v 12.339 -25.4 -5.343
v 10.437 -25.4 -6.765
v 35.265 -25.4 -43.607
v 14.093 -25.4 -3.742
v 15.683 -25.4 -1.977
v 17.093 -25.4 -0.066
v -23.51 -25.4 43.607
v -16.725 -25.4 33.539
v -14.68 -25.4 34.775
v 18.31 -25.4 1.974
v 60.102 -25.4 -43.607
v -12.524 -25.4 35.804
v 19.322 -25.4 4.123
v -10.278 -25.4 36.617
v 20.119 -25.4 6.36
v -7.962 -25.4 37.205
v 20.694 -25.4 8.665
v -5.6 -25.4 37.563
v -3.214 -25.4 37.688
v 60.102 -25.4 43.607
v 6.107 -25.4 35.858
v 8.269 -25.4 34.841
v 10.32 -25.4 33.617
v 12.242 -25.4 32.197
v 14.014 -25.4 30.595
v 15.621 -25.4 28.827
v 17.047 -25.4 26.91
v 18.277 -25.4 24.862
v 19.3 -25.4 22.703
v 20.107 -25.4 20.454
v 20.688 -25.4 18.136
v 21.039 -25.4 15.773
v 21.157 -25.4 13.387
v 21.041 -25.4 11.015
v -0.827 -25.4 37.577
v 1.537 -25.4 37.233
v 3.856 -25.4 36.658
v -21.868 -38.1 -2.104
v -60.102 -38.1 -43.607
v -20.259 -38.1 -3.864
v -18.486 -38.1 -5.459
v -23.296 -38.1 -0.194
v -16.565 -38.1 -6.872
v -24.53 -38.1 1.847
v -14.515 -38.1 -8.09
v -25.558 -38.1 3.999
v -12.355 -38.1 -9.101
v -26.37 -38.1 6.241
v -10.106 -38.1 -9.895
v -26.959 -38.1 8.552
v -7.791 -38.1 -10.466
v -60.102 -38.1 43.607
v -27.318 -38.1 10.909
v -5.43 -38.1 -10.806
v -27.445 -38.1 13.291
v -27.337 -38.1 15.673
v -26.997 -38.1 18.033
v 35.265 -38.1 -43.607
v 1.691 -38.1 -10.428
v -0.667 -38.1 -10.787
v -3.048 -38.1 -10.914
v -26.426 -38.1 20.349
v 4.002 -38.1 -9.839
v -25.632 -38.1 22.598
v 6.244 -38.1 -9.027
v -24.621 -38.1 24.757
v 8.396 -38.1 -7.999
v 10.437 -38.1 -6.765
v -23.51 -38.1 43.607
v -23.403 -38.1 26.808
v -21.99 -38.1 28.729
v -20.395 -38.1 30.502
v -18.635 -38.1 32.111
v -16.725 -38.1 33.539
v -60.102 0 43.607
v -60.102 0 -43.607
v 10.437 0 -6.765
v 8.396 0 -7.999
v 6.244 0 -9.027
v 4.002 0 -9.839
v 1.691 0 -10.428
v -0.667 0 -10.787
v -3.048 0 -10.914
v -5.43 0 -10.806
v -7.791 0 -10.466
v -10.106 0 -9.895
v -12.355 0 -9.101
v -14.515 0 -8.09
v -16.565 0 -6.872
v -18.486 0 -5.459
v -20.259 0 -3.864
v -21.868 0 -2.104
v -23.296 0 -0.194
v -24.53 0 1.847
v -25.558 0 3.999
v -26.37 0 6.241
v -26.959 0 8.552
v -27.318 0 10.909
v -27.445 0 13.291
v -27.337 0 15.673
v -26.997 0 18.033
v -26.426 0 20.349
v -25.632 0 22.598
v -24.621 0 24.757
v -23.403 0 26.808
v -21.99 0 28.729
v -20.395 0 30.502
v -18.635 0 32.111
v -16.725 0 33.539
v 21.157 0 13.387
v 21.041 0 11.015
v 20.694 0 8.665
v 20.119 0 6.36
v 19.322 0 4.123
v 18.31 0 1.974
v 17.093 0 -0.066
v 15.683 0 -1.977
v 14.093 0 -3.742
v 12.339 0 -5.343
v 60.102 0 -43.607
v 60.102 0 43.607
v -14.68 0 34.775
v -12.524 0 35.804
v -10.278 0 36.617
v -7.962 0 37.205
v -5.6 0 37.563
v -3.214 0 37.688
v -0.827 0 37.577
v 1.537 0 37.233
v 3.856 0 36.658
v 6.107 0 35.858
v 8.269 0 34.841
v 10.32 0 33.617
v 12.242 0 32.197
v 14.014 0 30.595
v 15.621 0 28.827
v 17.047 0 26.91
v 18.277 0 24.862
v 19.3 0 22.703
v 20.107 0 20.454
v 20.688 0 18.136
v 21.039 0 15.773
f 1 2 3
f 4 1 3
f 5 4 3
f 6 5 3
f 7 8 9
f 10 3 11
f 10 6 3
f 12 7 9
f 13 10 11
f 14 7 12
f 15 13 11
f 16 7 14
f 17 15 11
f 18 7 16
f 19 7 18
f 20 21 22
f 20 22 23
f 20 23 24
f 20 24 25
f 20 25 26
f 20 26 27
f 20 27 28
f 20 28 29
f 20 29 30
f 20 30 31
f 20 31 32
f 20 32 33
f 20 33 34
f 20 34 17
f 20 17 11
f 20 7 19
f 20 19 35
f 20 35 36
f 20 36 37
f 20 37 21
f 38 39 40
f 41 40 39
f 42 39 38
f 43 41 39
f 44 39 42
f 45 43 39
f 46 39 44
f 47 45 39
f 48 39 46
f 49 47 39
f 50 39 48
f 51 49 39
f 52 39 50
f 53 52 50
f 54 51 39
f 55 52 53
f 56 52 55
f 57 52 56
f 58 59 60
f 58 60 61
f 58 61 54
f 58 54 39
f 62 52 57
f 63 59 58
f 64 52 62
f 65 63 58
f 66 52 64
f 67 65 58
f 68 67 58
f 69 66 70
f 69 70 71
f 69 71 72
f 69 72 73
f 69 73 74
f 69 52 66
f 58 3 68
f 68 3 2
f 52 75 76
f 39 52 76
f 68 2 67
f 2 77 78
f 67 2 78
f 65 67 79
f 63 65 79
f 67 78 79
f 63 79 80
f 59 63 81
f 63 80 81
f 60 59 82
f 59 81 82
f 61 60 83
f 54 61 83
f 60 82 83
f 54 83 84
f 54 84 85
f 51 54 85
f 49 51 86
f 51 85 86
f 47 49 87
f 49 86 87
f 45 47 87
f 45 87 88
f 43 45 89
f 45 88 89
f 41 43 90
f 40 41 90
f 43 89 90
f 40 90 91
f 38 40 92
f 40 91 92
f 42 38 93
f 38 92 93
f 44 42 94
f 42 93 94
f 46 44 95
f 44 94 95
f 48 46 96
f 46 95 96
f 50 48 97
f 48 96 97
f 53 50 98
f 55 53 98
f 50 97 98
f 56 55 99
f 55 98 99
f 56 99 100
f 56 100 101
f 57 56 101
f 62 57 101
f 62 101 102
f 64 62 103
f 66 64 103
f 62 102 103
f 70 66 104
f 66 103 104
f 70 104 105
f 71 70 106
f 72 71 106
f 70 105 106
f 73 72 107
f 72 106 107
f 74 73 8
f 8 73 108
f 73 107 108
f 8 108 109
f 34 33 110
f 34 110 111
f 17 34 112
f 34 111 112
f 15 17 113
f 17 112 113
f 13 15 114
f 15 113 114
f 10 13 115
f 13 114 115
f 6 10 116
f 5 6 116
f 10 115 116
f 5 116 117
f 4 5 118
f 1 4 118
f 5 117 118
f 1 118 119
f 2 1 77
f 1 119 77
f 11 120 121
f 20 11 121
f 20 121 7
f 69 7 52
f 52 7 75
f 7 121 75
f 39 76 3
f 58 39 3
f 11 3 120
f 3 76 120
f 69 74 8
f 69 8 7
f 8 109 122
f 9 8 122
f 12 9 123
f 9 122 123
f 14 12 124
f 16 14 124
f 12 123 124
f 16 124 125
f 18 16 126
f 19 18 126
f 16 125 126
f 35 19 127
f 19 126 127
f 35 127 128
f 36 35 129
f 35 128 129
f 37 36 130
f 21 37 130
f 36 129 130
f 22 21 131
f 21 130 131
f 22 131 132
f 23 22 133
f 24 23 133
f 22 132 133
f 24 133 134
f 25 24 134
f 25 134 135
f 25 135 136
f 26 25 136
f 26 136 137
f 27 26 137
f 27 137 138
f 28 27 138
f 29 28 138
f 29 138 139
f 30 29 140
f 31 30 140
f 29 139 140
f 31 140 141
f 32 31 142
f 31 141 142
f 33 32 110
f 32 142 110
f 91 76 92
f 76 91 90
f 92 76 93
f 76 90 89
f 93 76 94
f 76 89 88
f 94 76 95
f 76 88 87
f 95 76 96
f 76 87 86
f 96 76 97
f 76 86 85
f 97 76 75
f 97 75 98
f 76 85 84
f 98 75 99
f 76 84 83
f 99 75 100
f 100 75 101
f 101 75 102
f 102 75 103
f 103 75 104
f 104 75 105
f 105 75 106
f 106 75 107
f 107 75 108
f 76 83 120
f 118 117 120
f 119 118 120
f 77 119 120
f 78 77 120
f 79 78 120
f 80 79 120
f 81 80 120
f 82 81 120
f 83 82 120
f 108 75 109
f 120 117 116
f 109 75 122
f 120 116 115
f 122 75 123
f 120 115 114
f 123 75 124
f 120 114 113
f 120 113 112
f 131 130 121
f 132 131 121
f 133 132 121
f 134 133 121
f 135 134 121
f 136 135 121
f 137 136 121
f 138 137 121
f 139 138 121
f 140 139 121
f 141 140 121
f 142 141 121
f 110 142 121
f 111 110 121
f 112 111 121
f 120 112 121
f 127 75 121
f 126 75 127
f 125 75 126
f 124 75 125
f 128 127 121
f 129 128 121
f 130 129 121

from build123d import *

# Parameters (mm, degrees)
F1_DEPTH = 38.1
F2_DEPTH = 25.4


with BuildPart() as f1:
    # F0 (on Front) → F1 (new body)
    with BuildSketch(Plane.XZ):
        with BuildLine():
            Line((-16.724718, 33.538792), (-23.510048, 43.607347))
            Line((-23.510048, 43.607347), (-60.102299, 43.607347))
            Line((-60.102299, 43.607347), (-60.102299, -43.607347))
            Line((-60.102299, -43.607347), (35.265073, -43.607347))
            Line((35.265073, -43.607347), (10.436524, -6.764985))
            ThreePointArc((10.436524, -6.764985), (-23.295985, -0.193718), (-16.724718, 33.538792))
        make_face()
    extrude(amount=F1_DEPTH)

    # F0 (on Front) → F2 (join)
    with BuildSketch(Plane.XZ):
        with BuildLine():
            Line((60.102299, -43.607347), (60.102299, 43.607347))
            Line((60.102299, 43.607347), (-23.510048, 43.607347))
            Line((-23.510048, 43.607347), (-16.724718, 33.538792))
            ThreePointArc((-16.724718, 33.538792), (8.268859, 34.840955), (21.156765, 13.386903))
            ThreePointArc((21.156765, 13.386903), (18.309955, 1.973948), (10.436524, -6.764985))
            Line((10.436524, -6.764985), (35.265073, -43.607347))
            Line((35.265073, -43.607347), (60.102299, -43.607347))
        make_face()
    extrude(amount=F2_DEPTH)


solid = f1.part
